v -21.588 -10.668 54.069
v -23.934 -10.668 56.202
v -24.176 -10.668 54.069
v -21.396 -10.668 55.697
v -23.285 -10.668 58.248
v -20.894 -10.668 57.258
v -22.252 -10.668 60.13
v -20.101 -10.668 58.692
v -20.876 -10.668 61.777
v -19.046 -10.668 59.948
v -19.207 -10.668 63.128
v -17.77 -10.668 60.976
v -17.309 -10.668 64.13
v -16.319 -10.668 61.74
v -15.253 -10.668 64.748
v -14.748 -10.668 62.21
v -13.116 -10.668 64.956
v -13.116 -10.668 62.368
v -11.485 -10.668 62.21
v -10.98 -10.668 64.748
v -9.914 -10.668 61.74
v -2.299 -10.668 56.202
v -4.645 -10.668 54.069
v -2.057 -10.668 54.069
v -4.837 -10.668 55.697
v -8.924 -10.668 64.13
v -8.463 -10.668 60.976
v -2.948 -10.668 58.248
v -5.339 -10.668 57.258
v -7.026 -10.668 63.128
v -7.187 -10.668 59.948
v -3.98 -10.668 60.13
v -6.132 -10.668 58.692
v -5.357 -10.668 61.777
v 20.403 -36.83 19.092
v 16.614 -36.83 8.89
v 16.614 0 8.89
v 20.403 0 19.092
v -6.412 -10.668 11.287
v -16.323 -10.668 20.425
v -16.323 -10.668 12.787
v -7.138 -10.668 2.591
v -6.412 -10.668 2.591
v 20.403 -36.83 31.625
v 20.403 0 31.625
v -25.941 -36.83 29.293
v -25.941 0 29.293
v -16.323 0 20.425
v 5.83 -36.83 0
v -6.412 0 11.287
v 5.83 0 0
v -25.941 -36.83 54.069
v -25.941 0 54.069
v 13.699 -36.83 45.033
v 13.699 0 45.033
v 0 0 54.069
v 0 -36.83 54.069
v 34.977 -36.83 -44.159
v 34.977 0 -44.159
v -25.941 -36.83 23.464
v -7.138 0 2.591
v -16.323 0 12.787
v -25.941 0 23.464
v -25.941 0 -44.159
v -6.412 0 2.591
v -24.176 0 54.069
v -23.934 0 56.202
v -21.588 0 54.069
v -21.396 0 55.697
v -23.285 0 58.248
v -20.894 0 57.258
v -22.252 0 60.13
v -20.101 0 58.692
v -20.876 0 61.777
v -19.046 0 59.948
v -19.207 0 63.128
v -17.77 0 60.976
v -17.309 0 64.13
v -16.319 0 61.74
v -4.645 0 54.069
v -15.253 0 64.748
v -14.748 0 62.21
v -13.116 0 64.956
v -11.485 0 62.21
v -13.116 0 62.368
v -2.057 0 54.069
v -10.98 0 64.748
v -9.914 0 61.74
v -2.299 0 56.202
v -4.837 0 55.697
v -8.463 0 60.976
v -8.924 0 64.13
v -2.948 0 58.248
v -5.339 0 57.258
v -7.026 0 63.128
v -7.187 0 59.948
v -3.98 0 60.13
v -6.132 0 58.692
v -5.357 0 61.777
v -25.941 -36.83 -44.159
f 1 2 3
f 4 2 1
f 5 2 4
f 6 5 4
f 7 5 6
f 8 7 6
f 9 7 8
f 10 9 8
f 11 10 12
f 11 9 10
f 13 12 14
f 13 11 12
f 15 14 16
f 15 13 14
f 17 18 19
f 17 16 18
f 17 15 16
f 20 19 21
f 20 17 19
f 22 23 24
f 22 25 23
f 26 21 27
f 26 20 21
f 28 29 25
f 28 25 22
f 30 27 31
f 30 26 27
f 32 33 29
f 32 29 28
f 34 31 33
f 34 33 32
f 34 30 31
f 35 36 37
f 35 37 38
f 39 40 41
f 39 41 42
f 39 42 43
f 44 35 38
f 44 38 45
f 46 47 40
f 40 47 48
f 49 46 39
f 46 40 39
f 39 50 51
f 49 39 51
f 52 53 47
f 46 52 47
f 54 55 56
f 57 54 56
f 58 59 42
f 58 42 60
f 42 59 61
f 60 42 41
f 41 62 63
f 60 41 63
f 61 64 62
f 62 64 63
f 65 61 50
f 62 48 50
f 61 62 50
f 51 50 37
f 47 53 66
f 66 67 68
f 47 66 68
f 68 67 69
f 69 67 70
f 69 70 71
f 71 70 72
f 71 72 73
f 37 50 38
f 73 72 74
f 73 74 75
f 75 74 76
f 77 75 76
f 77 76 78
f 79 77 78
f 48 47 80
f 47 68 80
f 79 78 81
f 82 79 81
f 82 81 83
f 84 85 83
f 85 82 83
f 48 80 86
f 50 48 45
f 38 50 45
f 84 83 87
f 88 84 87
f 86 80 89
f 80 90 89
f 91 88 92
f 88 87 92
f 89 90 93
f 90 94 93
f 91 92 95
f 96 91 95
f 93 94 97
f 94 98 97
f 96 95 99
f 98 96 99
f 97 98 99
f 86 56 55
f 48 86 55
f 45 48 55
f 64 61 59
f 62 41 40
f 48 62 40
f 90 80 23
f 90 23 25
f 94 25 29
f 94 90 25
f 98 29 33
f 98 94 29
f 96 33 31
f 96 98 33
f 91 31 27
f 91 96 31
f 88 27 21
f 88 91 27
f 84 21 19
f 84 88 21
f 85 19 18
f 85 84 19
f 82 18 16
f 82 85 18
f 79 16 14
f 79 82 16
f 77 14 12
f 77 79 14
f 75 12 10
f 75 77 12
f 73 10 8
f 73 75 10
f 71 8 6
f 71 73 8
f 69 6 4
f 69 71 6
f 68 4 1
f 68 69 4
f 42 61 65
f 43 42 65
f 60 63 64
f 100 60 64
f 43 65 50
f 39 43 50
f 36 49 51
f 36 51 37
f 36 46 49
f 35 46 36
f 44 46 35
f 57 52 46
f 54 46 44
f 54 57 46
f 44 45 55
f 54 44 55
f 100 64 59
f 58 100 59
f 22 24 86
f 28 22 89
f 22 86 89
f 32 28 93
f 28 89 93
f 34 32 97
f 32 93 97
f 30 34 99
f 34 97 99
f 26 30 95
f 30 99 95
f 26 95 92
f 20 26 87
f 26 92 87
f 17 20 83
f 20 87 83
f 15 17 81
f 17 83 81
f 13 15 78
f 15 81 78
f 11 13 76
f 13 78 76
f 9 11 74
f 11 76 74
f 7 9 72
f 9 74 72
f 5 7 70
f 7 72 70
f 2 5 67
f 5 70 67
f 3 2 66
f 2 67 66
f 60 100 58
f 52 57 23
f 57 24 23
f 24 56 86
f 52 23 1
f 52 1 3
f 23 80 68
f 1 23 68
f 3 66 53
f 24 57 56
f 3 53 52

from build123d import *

# Parameters (mm, degrees)
F1_DEPTH = 36.83
F2_W     = 9.9101620726
F2_H     = 20.4049523454
F2_R     = 11.0608053269
F2_R_2   = 8.4731634686
F3_DEPTH = 10.668


with BuildPart() as f1:
    # F0 (on Front) → F1 (new body)
    with BuildSketch(Plane.XZ):
        Polygon((34.9770523608, -44.1585220397), (-25.9413123131, 23.4637726098), (-25.9413123131, -44.1585220397), align=None)
    extrude(amount=F1_DEPTH)



with BuildPart() as f1b:
    # F0 (on Front) → F1, piece 2 (new body)
    with BuildSketch(Plane.XZ):
        Polygon((-25.9413123131, 54.0686920285), (-25.9413123131, 29.2932782322), (5.829508882, 0), (16.6140999645, 8.890000172), (20.4032789916, 19.0916396677), (20.4032789916, 31.6250808537), (13.699343428, 45.0329519808), (0, 54.0686920285), align=None)
    extrude(amount=F1_DEPTH)


with BuildPart() as f1_1:
    add(f1.part)

    add(f1b.part)  # F3 merges F1b
    # F2 (on Front) → F3 (join)
    with BuildSketch(Plane.XZ):
        with Locations((-11.3675410394, 12.7937035868)):
            Rectangle(F2_W, F2_H)
        with Locations((-13.1163941696, 53.8951084018)):
            Circle(F2_R)
        with Locations((-13.1163941696, 53.8951084018)):
            Circle(F2_R_2, mode=Mode.SUBTRACT)
    extrude(amount=F3_DEPTH)


solid = f1_1.part
